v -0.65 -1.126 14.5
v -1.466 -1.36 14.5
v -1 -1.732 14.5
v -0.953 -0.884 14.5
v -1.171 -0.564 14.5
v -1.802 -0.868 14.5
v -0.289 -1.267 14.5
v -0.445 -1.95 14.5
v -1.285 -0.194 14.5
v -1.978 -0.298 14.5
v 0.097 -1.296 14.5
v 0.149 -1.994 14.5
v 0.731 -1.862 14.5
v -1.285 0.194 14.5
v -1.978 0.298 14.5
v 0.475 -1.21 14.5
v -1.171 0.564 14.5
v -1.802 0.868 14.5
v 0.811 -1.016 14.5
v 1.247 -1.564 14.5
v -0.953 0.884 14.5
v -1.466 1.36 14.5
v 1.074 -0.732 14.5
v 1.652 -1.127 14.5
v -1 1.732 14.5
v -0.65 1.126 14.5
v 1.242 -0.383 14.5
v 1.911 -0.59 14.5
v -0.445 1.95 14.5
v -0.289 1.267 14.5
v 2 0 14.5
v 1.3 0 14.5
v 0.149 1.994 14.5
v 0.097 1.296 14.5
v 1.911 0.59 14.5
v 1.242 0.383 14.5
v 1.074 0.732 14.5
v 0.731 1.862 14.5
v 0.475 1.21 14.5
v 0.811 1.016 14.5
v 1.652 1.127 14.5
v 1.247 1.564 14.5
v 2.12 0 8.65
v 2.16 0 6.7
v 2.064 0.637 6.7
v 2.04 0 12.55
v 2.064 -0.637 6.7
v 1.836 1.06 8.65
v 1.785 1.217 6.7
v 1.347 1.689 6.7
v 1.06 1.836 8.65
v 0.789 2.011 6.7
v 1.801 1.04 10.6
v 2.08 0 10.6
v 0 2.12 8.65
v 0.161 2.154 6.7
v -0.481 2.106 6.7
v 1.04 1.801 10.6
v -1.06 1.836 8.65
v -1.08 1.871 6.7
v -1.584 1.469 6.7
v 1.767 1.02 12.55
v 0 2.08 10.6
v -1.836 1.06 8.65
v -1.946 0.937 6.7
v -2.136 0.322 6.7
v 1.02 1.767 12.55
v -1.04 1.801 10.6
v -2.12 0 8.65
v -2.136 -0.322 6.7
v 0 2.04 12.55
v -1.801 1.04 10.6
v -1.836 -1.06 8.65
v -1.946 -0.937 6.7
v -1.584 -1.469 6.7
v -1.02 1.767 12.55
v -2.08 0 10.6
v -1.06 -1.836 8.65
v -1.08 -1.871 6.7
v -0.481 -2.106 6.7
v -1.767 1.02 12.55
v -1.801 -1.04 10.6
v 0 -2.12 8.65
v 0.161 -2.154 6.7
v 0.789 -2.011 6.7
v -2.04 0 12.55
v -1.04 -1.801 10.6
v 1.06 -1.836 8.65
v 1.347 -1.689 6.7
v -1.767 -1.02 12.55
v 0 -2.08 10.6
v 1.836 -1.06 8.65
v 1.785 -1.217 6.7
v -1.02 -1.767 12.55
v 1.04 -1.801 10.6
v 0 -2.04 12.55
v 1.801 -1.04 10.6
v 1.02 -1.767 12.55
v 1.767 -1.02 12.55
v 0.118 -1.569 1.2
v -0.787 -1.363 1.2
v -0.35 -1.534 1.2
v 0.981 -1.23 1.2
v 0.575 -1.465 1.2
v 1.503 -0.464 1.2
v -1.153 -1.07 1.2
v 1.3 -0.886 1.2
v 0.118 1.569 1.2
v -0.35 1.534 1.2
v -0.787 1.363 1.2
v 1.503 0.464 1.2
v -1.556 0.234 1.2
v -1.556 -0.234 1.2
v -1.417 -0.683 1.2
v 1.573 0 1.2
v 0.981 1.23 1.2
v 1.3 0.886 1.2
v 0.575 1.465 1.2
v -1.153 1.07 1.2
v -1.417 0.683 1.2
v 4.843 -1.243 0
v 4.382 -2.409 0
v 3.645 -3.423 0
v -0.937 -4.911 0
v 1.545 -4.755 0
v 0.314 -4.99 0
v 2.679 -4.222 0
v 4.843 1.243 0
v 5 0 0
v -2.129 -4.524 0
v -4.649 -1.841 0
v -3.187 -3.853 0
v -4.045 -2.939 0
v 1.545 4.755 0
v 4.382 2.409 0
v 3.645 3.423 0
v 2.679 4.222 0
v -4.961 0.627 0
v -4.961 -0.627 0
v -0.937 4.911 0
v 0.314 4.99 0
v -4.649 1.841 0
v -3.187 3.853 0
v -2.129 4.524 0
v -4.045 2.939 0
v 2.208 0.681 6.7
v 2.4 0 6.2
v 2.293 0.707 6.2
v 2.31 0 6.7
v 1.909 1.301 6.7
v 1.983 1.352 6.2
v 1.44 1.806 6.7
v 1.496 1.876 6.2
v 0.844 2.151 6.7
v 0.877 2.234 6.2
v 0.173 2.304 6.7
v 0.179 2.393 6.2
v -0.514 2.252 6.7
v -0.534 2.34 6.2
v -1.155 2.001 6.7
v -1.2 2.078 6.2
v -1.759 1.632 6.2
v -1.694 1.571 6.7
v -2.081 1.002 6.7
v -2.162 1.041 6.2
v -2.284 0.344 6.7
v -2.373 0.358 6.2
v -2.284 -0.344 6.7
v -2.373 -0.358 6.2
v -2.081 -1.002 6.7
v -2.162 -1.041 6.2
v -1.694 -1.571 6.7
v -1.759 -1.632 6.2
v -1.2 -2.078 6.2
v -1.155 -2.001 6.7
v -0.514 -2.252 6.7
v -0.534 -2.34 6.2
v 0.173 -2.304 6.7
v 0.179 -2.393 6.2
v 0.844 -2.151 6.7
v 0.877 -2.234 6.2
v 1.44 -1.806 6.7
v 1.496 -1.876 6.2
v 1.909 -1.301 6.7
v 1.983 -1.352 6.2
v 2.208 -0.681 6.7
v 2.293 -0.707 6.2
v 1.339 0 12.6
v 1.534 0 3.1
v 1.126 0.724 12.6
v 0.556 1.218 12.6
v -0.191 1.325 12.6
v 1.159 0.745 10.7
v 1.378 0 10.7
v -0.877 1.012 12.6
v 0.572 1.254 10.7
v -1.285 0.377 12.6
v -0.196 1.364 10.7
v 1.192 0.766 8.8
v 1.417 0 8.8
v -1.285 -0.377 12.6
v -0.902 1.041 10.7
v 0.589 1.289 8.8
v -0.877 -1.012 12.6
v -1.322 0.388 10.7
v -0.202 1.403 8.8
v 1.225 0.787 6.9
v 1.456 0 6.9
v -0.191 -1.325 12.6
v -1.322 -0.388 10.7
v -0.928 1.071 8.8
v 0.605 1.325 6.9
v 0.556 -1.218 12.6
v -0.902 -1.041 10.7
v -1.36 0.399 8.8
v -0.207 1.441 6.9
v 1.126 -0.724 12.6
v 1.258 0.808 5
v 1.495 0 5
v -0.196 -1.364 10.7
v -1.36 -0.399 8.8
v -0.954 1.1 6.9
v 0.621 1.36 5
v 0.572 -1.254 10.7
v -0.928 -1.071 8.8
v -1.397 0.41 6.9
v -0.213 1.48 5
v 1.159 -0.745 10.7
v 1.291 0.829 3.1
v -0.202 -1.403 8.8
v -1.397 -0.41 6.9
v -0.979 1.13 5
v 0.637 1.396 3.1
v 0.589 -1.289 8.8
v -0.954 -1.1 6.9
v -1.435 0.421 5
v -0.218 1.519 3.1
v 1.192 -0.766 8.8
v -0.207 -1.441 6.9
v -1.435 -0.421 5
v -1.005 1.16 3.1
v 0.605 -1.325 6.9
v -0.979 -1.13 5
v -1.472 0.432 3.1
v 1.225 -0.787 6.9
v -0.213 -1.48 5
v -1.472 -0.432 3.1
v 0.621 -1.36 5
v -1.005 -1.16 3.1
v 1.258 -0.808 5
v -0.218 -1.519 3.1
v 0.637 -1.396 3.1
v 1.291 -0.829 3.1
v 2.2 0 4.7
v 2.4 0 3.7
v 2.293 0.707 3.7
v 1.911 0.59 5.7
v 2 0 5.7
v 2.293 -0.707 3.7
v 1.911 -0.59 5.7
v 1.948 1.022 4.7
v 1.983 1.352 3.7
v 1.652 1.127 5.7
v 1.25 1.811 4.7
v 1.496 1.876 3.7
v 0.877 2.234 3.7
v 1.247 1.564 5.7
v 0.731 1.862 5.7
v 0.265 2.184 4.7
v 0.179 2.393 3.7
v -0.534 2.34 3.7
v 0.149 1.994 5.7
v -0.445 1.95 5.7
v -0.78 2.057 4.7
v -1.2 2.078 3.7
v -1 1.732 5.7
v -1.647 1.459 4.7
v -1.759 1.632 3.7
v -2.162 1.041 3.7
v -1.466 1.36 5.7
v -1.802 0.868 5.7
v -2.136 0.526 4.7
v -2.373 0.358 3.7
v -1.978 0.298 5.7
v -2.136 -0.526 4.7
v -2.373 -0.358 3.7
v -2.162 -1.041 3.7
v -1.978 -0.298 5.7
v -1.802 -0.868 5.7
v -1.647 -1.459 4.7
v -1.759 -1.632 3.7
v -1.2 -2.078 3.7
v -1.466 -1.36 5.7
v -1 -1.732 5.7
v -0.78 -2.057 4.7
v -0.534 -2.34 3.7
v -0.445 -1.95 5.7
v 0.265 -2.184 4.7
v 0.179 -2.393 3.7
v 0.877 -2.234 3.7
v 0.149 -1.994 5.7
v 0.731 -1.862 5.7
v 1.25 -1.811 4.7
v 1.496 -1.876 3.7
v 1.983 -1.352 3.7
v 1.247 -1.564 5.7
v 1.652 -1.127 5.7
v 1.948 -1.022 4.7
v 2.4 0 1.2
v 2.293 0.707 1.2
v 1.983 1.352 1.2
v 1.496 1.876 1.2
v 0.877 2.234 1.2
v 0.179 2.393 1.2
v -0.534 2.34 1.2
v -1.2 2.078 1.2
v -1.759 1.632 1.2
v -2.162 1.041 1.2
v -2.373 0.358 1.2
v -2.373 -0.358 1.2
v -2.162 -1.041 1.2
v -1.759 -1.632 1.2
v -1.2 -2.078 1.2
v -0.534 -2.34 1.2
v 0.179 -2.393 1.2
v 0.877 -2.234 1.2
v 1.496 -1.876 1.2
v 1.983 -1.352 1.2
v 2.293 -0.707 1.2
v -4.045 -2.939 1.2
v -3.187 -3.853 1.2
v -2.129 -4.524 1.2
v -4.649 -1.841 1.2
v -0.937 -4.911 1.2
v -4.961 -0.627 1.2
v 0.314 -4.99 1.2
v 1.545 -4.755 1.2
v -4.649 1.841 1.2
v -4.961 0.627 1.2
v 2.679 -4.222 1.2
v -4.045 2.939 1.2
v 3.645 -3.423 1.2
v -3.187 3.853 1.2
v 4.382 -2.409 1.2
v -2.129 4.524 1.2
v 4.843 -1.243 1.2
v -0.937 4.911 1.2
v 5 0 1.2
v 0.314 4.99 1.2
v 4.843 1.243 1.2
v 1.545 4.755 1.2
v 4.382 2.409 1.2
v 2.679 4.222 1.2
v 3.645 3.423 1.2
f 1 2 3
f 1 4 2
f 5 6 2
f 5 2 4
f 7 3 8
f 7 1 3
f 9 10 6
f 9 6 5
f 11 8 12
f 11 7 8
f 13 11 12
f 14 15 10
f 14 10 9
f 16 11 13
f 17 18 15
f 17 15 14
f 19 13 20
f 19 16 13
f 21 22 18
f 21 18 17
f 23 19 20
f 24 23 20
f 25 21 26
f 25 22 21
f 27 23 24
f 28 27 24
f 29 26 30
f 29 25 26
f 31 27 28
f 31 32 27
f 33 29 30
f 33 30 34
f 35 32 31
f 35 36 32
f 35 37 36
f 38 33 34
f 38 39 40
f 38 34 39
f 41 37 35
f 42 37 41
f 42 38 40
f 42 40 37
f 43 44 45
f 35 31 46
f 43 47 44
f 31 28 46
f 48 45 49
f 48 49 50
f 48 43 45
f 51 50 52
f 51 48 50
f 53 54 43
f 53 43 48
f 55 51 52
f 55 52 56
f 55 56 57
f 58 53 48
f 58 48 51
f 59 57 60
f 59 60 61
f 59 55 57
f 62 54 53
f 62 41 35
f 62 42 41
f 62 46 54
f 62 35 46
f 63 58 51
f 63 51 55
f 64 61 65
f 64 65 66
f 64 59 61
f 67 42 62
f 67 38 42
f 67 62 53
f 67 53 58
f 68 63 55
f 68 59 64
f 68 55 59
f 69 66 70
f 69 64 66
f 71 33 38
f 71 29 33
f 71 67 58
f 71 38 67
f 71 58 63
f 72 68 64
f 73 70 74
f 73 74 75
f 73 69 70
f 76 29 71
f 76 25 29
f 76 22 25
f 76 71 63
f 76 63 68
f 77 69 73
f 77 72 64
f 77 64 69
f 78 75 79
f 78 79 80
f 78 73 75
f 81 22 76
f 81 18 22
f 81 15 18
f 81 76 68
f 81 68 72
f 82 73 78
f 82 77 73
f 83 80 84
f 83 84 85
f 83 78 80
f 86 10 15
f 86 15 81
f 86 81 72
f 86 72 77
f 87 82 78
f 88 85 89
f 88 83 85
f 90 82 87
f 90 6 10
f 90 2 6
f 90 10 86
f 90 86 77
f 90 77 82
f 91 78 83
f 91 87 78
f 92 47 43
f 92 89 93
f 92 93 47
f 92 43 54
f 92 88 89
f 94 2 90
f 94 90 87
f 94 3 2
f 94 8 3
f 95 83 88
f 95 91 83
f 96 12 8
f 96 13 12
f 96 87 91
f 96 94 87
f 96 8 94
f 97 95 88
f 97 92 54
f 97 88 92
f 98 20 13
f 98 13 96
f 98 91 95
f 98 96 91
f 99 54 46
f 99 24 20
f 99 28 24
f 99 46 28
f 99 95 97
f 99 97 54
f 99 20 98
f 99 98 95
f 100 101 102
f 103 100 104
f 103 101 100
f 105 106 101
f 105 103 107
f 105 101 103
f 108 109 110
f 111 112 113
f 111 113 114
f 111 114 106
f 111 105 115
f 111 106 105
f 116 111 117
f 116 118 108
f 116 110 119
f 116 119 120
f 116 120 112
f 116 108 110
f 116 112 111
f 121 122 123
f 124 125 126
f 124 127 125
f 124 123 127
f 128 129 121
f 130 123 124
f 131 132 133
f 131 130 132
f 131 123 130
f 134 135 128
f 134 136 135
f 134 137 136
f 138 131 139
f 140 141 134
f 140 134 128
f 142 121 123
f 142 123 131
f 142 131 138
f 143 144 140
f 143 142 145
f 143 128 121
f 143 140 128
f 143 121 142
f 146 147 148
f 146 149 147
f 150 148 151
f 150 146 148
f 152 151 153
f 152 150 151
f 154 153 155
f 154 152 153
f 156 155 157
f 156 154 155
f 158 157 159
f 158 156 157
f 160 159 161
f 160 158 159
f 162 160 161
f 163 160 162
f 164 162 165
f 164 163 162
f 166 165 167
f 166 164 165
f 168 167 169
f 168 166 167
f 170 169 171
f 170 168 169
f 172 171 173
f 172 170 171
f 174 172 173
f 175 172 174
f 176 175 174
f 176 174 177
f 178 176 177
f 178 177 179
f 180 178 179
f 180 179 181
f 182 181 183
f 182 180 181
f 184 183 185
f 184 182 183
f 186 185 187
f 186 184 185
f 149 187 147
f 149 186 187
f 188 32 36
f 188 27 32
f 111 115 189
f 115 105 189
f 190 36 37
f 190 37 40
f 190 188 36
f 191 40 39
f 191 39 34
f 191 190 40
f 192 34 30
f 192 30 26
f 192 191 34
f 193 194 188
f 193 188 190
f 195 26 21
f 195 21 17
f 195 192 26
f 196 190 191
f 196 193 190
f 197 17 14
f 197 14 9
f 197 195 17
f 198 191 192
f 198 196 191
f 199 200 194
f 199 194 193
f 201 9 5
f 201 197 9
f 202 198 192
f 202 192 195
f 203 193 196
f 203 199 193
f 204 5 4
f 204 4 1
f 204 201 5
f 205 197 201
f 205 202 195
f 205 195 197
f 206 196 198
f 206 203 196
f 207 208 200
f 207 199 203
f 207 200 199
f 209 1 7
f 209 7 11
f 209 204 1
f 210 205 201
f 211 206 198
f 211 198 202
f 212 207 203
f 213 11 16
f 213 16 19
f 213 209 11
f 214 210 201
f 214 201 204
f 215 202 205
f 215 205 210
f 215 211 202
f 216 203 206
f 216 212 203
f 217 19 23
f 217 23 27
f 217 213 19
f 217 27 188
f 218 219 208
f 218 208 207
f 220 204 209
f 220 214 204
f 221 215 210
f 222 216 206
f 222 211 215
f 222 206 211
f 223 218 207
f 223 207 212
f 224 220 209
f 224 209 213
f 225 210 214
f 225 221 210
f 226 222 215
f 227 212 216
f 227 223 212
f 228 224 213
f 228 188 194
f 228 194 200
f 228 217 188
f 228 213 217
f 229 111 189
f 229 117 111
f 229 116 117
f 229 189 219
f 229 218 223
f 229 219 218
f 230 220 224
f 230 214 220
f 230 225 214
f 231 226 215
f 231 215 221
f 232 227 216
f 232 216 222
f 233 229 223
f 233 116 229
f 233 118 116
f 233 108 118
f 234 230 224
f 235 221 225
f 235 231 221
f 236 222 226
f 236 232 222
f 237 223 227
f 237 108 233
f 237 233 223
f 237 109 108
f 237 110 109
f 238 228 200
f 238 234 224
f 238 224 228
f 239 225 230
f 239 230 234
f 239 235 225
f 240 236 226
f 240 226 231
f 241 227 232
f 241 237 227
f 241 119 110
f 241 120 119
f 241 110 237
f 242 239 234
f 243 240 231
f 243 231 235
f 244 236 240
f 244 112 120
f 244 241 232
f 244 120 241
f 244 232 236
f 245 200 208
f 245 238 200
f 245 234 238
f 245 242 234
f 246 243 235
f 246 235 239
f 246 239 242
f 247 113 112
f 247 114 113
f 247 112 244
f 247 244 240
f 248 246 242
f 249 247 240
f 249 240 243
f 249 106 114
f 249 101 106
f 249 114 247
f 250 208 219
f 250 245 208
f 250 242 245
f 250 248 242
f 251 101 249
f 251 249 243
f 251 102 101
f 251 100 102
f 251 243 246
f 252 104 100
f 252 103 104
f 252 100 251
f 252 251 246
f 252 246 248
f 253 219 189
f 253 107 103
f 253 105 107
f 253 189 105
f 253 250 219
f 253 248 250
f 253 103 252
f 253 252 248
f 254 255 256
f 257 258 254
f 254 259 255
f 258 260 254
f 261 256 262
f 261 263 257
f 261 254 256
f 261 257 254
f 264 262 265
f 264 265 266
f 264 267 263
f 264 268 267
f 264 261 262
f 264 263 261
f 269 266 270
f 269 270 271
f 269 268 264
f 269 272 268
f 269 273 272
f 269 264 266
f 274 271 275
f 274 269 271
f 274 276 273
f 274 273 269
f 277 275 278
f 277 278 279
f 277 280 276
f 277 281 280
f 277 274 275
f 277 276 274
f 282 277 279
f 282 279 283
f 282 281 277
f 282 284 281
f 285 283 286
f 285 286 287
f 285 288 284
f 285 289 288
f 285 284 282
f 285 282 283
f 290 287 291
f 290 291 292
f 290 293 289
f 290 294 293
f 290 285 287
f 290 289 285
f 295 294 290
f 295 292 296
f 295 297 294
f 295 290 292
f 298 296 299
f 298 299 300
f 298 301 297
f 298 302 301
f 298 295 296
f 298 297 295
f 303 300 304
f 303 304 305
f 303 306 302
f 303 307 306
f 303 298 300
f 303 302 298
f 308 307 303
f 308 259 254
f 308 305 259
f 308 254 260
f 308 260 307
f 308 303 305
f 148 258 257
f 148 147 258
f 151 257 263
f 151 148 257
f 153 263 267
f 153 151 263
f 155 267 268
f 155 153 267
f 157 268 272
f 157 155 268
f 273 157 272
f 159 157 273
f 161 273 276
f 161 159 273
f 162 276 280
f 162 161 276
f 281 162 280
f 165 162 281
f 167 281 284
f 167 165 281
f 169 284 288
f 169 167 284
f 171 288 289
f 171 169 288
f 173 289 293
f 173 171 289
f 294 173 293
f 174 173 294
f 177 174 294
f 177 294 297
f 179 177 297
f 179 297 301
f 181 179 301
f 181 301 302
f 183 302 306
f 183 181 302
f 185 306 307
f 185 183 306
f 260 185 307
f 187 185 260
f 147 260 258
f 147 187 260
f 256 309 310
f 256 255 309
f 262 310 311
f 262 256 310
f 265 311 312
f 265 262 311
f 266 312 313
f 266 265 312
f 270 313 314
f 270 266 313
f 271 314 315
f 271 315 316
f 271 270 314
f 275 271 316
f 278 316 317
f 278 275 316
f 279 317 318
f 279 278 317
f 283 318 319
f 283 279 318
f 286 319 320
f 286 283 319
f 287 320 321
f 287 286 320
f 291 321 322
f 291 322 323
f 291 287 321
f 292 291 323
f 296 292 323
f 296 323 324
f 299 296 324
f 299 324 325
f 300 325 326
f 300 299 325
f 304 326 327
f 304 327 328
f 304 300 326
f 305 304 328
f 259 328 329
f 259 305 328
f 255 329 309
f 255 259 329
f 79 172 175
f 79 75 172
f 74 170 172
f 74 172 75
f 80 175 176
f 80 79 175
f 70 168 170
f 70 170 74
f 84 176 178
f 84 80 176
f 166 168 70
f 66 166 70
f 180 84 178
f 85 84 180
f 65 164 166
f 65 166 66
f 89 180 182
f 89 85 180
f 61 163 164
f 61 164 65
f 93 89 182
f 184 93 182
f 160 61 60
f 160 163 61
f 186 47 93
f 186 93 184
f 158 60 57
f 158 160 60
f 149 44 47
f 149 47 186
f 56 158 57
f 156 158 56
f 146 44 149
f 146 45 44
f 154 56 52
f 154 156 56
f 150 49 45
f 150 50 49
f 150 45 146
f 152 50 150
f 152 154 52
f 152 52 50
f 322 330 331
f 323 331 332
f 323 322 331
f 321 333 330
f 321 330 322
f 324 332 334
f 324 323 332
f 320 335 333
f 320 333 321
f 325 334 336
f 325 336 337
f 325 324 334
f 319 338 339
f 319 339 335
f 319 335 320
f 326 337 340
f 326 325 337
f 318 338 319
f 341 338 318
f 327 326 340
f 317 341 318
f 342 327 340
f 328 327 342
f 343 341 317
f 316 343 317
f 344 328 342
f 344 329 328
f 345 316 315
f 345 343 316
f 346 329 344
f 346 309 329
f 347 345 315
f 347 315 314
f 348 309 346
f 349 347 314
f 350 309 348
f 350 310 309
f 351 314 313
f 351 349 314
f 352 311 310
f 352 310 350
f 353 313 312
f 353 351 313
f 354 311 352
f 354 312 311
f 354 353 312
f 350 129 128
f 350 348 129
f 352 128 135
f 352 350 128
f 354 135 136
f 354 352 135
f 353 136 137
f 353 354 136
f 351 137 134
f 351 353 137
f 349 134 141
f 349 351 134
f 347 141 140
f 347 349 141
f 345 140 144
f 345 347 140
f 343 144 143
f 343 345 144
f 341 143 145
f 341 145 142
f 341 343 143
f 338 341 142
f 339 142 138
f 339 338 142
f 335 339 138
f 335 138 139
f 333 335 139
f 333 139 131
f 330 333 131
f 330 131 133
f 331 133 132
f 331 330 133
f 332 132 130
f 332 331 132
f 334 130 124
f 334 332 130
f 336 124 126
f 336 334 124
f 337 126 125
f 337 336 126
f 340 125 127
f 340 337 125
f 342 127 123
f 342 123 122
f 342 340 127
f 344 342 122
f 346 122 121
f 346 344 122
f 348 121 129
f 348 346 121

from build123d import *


with BuildPart() as f1:
    # F0 (on Front) → F1 (revolve)
    with BuildSketch(Plane.XZ):
        Polygon((1.3, 14.5), (1.573288, 1.2), (2.4, 1.2), (2.4, 3.7), (2, 5.7), (2.4, 6.2), (2.310274, 6.7), (2.160274, 6.7), (2, 14.5), align=None)
        Polygon((0, 1.2), (0, 0), (5, 0), (5, 1.2), (2.4, 1.2), (1.573288, 1.2), align=None)
    revolve(axis=Axis((0, 0, 7.25), (0, 0, 1)))


solid = f1.part
